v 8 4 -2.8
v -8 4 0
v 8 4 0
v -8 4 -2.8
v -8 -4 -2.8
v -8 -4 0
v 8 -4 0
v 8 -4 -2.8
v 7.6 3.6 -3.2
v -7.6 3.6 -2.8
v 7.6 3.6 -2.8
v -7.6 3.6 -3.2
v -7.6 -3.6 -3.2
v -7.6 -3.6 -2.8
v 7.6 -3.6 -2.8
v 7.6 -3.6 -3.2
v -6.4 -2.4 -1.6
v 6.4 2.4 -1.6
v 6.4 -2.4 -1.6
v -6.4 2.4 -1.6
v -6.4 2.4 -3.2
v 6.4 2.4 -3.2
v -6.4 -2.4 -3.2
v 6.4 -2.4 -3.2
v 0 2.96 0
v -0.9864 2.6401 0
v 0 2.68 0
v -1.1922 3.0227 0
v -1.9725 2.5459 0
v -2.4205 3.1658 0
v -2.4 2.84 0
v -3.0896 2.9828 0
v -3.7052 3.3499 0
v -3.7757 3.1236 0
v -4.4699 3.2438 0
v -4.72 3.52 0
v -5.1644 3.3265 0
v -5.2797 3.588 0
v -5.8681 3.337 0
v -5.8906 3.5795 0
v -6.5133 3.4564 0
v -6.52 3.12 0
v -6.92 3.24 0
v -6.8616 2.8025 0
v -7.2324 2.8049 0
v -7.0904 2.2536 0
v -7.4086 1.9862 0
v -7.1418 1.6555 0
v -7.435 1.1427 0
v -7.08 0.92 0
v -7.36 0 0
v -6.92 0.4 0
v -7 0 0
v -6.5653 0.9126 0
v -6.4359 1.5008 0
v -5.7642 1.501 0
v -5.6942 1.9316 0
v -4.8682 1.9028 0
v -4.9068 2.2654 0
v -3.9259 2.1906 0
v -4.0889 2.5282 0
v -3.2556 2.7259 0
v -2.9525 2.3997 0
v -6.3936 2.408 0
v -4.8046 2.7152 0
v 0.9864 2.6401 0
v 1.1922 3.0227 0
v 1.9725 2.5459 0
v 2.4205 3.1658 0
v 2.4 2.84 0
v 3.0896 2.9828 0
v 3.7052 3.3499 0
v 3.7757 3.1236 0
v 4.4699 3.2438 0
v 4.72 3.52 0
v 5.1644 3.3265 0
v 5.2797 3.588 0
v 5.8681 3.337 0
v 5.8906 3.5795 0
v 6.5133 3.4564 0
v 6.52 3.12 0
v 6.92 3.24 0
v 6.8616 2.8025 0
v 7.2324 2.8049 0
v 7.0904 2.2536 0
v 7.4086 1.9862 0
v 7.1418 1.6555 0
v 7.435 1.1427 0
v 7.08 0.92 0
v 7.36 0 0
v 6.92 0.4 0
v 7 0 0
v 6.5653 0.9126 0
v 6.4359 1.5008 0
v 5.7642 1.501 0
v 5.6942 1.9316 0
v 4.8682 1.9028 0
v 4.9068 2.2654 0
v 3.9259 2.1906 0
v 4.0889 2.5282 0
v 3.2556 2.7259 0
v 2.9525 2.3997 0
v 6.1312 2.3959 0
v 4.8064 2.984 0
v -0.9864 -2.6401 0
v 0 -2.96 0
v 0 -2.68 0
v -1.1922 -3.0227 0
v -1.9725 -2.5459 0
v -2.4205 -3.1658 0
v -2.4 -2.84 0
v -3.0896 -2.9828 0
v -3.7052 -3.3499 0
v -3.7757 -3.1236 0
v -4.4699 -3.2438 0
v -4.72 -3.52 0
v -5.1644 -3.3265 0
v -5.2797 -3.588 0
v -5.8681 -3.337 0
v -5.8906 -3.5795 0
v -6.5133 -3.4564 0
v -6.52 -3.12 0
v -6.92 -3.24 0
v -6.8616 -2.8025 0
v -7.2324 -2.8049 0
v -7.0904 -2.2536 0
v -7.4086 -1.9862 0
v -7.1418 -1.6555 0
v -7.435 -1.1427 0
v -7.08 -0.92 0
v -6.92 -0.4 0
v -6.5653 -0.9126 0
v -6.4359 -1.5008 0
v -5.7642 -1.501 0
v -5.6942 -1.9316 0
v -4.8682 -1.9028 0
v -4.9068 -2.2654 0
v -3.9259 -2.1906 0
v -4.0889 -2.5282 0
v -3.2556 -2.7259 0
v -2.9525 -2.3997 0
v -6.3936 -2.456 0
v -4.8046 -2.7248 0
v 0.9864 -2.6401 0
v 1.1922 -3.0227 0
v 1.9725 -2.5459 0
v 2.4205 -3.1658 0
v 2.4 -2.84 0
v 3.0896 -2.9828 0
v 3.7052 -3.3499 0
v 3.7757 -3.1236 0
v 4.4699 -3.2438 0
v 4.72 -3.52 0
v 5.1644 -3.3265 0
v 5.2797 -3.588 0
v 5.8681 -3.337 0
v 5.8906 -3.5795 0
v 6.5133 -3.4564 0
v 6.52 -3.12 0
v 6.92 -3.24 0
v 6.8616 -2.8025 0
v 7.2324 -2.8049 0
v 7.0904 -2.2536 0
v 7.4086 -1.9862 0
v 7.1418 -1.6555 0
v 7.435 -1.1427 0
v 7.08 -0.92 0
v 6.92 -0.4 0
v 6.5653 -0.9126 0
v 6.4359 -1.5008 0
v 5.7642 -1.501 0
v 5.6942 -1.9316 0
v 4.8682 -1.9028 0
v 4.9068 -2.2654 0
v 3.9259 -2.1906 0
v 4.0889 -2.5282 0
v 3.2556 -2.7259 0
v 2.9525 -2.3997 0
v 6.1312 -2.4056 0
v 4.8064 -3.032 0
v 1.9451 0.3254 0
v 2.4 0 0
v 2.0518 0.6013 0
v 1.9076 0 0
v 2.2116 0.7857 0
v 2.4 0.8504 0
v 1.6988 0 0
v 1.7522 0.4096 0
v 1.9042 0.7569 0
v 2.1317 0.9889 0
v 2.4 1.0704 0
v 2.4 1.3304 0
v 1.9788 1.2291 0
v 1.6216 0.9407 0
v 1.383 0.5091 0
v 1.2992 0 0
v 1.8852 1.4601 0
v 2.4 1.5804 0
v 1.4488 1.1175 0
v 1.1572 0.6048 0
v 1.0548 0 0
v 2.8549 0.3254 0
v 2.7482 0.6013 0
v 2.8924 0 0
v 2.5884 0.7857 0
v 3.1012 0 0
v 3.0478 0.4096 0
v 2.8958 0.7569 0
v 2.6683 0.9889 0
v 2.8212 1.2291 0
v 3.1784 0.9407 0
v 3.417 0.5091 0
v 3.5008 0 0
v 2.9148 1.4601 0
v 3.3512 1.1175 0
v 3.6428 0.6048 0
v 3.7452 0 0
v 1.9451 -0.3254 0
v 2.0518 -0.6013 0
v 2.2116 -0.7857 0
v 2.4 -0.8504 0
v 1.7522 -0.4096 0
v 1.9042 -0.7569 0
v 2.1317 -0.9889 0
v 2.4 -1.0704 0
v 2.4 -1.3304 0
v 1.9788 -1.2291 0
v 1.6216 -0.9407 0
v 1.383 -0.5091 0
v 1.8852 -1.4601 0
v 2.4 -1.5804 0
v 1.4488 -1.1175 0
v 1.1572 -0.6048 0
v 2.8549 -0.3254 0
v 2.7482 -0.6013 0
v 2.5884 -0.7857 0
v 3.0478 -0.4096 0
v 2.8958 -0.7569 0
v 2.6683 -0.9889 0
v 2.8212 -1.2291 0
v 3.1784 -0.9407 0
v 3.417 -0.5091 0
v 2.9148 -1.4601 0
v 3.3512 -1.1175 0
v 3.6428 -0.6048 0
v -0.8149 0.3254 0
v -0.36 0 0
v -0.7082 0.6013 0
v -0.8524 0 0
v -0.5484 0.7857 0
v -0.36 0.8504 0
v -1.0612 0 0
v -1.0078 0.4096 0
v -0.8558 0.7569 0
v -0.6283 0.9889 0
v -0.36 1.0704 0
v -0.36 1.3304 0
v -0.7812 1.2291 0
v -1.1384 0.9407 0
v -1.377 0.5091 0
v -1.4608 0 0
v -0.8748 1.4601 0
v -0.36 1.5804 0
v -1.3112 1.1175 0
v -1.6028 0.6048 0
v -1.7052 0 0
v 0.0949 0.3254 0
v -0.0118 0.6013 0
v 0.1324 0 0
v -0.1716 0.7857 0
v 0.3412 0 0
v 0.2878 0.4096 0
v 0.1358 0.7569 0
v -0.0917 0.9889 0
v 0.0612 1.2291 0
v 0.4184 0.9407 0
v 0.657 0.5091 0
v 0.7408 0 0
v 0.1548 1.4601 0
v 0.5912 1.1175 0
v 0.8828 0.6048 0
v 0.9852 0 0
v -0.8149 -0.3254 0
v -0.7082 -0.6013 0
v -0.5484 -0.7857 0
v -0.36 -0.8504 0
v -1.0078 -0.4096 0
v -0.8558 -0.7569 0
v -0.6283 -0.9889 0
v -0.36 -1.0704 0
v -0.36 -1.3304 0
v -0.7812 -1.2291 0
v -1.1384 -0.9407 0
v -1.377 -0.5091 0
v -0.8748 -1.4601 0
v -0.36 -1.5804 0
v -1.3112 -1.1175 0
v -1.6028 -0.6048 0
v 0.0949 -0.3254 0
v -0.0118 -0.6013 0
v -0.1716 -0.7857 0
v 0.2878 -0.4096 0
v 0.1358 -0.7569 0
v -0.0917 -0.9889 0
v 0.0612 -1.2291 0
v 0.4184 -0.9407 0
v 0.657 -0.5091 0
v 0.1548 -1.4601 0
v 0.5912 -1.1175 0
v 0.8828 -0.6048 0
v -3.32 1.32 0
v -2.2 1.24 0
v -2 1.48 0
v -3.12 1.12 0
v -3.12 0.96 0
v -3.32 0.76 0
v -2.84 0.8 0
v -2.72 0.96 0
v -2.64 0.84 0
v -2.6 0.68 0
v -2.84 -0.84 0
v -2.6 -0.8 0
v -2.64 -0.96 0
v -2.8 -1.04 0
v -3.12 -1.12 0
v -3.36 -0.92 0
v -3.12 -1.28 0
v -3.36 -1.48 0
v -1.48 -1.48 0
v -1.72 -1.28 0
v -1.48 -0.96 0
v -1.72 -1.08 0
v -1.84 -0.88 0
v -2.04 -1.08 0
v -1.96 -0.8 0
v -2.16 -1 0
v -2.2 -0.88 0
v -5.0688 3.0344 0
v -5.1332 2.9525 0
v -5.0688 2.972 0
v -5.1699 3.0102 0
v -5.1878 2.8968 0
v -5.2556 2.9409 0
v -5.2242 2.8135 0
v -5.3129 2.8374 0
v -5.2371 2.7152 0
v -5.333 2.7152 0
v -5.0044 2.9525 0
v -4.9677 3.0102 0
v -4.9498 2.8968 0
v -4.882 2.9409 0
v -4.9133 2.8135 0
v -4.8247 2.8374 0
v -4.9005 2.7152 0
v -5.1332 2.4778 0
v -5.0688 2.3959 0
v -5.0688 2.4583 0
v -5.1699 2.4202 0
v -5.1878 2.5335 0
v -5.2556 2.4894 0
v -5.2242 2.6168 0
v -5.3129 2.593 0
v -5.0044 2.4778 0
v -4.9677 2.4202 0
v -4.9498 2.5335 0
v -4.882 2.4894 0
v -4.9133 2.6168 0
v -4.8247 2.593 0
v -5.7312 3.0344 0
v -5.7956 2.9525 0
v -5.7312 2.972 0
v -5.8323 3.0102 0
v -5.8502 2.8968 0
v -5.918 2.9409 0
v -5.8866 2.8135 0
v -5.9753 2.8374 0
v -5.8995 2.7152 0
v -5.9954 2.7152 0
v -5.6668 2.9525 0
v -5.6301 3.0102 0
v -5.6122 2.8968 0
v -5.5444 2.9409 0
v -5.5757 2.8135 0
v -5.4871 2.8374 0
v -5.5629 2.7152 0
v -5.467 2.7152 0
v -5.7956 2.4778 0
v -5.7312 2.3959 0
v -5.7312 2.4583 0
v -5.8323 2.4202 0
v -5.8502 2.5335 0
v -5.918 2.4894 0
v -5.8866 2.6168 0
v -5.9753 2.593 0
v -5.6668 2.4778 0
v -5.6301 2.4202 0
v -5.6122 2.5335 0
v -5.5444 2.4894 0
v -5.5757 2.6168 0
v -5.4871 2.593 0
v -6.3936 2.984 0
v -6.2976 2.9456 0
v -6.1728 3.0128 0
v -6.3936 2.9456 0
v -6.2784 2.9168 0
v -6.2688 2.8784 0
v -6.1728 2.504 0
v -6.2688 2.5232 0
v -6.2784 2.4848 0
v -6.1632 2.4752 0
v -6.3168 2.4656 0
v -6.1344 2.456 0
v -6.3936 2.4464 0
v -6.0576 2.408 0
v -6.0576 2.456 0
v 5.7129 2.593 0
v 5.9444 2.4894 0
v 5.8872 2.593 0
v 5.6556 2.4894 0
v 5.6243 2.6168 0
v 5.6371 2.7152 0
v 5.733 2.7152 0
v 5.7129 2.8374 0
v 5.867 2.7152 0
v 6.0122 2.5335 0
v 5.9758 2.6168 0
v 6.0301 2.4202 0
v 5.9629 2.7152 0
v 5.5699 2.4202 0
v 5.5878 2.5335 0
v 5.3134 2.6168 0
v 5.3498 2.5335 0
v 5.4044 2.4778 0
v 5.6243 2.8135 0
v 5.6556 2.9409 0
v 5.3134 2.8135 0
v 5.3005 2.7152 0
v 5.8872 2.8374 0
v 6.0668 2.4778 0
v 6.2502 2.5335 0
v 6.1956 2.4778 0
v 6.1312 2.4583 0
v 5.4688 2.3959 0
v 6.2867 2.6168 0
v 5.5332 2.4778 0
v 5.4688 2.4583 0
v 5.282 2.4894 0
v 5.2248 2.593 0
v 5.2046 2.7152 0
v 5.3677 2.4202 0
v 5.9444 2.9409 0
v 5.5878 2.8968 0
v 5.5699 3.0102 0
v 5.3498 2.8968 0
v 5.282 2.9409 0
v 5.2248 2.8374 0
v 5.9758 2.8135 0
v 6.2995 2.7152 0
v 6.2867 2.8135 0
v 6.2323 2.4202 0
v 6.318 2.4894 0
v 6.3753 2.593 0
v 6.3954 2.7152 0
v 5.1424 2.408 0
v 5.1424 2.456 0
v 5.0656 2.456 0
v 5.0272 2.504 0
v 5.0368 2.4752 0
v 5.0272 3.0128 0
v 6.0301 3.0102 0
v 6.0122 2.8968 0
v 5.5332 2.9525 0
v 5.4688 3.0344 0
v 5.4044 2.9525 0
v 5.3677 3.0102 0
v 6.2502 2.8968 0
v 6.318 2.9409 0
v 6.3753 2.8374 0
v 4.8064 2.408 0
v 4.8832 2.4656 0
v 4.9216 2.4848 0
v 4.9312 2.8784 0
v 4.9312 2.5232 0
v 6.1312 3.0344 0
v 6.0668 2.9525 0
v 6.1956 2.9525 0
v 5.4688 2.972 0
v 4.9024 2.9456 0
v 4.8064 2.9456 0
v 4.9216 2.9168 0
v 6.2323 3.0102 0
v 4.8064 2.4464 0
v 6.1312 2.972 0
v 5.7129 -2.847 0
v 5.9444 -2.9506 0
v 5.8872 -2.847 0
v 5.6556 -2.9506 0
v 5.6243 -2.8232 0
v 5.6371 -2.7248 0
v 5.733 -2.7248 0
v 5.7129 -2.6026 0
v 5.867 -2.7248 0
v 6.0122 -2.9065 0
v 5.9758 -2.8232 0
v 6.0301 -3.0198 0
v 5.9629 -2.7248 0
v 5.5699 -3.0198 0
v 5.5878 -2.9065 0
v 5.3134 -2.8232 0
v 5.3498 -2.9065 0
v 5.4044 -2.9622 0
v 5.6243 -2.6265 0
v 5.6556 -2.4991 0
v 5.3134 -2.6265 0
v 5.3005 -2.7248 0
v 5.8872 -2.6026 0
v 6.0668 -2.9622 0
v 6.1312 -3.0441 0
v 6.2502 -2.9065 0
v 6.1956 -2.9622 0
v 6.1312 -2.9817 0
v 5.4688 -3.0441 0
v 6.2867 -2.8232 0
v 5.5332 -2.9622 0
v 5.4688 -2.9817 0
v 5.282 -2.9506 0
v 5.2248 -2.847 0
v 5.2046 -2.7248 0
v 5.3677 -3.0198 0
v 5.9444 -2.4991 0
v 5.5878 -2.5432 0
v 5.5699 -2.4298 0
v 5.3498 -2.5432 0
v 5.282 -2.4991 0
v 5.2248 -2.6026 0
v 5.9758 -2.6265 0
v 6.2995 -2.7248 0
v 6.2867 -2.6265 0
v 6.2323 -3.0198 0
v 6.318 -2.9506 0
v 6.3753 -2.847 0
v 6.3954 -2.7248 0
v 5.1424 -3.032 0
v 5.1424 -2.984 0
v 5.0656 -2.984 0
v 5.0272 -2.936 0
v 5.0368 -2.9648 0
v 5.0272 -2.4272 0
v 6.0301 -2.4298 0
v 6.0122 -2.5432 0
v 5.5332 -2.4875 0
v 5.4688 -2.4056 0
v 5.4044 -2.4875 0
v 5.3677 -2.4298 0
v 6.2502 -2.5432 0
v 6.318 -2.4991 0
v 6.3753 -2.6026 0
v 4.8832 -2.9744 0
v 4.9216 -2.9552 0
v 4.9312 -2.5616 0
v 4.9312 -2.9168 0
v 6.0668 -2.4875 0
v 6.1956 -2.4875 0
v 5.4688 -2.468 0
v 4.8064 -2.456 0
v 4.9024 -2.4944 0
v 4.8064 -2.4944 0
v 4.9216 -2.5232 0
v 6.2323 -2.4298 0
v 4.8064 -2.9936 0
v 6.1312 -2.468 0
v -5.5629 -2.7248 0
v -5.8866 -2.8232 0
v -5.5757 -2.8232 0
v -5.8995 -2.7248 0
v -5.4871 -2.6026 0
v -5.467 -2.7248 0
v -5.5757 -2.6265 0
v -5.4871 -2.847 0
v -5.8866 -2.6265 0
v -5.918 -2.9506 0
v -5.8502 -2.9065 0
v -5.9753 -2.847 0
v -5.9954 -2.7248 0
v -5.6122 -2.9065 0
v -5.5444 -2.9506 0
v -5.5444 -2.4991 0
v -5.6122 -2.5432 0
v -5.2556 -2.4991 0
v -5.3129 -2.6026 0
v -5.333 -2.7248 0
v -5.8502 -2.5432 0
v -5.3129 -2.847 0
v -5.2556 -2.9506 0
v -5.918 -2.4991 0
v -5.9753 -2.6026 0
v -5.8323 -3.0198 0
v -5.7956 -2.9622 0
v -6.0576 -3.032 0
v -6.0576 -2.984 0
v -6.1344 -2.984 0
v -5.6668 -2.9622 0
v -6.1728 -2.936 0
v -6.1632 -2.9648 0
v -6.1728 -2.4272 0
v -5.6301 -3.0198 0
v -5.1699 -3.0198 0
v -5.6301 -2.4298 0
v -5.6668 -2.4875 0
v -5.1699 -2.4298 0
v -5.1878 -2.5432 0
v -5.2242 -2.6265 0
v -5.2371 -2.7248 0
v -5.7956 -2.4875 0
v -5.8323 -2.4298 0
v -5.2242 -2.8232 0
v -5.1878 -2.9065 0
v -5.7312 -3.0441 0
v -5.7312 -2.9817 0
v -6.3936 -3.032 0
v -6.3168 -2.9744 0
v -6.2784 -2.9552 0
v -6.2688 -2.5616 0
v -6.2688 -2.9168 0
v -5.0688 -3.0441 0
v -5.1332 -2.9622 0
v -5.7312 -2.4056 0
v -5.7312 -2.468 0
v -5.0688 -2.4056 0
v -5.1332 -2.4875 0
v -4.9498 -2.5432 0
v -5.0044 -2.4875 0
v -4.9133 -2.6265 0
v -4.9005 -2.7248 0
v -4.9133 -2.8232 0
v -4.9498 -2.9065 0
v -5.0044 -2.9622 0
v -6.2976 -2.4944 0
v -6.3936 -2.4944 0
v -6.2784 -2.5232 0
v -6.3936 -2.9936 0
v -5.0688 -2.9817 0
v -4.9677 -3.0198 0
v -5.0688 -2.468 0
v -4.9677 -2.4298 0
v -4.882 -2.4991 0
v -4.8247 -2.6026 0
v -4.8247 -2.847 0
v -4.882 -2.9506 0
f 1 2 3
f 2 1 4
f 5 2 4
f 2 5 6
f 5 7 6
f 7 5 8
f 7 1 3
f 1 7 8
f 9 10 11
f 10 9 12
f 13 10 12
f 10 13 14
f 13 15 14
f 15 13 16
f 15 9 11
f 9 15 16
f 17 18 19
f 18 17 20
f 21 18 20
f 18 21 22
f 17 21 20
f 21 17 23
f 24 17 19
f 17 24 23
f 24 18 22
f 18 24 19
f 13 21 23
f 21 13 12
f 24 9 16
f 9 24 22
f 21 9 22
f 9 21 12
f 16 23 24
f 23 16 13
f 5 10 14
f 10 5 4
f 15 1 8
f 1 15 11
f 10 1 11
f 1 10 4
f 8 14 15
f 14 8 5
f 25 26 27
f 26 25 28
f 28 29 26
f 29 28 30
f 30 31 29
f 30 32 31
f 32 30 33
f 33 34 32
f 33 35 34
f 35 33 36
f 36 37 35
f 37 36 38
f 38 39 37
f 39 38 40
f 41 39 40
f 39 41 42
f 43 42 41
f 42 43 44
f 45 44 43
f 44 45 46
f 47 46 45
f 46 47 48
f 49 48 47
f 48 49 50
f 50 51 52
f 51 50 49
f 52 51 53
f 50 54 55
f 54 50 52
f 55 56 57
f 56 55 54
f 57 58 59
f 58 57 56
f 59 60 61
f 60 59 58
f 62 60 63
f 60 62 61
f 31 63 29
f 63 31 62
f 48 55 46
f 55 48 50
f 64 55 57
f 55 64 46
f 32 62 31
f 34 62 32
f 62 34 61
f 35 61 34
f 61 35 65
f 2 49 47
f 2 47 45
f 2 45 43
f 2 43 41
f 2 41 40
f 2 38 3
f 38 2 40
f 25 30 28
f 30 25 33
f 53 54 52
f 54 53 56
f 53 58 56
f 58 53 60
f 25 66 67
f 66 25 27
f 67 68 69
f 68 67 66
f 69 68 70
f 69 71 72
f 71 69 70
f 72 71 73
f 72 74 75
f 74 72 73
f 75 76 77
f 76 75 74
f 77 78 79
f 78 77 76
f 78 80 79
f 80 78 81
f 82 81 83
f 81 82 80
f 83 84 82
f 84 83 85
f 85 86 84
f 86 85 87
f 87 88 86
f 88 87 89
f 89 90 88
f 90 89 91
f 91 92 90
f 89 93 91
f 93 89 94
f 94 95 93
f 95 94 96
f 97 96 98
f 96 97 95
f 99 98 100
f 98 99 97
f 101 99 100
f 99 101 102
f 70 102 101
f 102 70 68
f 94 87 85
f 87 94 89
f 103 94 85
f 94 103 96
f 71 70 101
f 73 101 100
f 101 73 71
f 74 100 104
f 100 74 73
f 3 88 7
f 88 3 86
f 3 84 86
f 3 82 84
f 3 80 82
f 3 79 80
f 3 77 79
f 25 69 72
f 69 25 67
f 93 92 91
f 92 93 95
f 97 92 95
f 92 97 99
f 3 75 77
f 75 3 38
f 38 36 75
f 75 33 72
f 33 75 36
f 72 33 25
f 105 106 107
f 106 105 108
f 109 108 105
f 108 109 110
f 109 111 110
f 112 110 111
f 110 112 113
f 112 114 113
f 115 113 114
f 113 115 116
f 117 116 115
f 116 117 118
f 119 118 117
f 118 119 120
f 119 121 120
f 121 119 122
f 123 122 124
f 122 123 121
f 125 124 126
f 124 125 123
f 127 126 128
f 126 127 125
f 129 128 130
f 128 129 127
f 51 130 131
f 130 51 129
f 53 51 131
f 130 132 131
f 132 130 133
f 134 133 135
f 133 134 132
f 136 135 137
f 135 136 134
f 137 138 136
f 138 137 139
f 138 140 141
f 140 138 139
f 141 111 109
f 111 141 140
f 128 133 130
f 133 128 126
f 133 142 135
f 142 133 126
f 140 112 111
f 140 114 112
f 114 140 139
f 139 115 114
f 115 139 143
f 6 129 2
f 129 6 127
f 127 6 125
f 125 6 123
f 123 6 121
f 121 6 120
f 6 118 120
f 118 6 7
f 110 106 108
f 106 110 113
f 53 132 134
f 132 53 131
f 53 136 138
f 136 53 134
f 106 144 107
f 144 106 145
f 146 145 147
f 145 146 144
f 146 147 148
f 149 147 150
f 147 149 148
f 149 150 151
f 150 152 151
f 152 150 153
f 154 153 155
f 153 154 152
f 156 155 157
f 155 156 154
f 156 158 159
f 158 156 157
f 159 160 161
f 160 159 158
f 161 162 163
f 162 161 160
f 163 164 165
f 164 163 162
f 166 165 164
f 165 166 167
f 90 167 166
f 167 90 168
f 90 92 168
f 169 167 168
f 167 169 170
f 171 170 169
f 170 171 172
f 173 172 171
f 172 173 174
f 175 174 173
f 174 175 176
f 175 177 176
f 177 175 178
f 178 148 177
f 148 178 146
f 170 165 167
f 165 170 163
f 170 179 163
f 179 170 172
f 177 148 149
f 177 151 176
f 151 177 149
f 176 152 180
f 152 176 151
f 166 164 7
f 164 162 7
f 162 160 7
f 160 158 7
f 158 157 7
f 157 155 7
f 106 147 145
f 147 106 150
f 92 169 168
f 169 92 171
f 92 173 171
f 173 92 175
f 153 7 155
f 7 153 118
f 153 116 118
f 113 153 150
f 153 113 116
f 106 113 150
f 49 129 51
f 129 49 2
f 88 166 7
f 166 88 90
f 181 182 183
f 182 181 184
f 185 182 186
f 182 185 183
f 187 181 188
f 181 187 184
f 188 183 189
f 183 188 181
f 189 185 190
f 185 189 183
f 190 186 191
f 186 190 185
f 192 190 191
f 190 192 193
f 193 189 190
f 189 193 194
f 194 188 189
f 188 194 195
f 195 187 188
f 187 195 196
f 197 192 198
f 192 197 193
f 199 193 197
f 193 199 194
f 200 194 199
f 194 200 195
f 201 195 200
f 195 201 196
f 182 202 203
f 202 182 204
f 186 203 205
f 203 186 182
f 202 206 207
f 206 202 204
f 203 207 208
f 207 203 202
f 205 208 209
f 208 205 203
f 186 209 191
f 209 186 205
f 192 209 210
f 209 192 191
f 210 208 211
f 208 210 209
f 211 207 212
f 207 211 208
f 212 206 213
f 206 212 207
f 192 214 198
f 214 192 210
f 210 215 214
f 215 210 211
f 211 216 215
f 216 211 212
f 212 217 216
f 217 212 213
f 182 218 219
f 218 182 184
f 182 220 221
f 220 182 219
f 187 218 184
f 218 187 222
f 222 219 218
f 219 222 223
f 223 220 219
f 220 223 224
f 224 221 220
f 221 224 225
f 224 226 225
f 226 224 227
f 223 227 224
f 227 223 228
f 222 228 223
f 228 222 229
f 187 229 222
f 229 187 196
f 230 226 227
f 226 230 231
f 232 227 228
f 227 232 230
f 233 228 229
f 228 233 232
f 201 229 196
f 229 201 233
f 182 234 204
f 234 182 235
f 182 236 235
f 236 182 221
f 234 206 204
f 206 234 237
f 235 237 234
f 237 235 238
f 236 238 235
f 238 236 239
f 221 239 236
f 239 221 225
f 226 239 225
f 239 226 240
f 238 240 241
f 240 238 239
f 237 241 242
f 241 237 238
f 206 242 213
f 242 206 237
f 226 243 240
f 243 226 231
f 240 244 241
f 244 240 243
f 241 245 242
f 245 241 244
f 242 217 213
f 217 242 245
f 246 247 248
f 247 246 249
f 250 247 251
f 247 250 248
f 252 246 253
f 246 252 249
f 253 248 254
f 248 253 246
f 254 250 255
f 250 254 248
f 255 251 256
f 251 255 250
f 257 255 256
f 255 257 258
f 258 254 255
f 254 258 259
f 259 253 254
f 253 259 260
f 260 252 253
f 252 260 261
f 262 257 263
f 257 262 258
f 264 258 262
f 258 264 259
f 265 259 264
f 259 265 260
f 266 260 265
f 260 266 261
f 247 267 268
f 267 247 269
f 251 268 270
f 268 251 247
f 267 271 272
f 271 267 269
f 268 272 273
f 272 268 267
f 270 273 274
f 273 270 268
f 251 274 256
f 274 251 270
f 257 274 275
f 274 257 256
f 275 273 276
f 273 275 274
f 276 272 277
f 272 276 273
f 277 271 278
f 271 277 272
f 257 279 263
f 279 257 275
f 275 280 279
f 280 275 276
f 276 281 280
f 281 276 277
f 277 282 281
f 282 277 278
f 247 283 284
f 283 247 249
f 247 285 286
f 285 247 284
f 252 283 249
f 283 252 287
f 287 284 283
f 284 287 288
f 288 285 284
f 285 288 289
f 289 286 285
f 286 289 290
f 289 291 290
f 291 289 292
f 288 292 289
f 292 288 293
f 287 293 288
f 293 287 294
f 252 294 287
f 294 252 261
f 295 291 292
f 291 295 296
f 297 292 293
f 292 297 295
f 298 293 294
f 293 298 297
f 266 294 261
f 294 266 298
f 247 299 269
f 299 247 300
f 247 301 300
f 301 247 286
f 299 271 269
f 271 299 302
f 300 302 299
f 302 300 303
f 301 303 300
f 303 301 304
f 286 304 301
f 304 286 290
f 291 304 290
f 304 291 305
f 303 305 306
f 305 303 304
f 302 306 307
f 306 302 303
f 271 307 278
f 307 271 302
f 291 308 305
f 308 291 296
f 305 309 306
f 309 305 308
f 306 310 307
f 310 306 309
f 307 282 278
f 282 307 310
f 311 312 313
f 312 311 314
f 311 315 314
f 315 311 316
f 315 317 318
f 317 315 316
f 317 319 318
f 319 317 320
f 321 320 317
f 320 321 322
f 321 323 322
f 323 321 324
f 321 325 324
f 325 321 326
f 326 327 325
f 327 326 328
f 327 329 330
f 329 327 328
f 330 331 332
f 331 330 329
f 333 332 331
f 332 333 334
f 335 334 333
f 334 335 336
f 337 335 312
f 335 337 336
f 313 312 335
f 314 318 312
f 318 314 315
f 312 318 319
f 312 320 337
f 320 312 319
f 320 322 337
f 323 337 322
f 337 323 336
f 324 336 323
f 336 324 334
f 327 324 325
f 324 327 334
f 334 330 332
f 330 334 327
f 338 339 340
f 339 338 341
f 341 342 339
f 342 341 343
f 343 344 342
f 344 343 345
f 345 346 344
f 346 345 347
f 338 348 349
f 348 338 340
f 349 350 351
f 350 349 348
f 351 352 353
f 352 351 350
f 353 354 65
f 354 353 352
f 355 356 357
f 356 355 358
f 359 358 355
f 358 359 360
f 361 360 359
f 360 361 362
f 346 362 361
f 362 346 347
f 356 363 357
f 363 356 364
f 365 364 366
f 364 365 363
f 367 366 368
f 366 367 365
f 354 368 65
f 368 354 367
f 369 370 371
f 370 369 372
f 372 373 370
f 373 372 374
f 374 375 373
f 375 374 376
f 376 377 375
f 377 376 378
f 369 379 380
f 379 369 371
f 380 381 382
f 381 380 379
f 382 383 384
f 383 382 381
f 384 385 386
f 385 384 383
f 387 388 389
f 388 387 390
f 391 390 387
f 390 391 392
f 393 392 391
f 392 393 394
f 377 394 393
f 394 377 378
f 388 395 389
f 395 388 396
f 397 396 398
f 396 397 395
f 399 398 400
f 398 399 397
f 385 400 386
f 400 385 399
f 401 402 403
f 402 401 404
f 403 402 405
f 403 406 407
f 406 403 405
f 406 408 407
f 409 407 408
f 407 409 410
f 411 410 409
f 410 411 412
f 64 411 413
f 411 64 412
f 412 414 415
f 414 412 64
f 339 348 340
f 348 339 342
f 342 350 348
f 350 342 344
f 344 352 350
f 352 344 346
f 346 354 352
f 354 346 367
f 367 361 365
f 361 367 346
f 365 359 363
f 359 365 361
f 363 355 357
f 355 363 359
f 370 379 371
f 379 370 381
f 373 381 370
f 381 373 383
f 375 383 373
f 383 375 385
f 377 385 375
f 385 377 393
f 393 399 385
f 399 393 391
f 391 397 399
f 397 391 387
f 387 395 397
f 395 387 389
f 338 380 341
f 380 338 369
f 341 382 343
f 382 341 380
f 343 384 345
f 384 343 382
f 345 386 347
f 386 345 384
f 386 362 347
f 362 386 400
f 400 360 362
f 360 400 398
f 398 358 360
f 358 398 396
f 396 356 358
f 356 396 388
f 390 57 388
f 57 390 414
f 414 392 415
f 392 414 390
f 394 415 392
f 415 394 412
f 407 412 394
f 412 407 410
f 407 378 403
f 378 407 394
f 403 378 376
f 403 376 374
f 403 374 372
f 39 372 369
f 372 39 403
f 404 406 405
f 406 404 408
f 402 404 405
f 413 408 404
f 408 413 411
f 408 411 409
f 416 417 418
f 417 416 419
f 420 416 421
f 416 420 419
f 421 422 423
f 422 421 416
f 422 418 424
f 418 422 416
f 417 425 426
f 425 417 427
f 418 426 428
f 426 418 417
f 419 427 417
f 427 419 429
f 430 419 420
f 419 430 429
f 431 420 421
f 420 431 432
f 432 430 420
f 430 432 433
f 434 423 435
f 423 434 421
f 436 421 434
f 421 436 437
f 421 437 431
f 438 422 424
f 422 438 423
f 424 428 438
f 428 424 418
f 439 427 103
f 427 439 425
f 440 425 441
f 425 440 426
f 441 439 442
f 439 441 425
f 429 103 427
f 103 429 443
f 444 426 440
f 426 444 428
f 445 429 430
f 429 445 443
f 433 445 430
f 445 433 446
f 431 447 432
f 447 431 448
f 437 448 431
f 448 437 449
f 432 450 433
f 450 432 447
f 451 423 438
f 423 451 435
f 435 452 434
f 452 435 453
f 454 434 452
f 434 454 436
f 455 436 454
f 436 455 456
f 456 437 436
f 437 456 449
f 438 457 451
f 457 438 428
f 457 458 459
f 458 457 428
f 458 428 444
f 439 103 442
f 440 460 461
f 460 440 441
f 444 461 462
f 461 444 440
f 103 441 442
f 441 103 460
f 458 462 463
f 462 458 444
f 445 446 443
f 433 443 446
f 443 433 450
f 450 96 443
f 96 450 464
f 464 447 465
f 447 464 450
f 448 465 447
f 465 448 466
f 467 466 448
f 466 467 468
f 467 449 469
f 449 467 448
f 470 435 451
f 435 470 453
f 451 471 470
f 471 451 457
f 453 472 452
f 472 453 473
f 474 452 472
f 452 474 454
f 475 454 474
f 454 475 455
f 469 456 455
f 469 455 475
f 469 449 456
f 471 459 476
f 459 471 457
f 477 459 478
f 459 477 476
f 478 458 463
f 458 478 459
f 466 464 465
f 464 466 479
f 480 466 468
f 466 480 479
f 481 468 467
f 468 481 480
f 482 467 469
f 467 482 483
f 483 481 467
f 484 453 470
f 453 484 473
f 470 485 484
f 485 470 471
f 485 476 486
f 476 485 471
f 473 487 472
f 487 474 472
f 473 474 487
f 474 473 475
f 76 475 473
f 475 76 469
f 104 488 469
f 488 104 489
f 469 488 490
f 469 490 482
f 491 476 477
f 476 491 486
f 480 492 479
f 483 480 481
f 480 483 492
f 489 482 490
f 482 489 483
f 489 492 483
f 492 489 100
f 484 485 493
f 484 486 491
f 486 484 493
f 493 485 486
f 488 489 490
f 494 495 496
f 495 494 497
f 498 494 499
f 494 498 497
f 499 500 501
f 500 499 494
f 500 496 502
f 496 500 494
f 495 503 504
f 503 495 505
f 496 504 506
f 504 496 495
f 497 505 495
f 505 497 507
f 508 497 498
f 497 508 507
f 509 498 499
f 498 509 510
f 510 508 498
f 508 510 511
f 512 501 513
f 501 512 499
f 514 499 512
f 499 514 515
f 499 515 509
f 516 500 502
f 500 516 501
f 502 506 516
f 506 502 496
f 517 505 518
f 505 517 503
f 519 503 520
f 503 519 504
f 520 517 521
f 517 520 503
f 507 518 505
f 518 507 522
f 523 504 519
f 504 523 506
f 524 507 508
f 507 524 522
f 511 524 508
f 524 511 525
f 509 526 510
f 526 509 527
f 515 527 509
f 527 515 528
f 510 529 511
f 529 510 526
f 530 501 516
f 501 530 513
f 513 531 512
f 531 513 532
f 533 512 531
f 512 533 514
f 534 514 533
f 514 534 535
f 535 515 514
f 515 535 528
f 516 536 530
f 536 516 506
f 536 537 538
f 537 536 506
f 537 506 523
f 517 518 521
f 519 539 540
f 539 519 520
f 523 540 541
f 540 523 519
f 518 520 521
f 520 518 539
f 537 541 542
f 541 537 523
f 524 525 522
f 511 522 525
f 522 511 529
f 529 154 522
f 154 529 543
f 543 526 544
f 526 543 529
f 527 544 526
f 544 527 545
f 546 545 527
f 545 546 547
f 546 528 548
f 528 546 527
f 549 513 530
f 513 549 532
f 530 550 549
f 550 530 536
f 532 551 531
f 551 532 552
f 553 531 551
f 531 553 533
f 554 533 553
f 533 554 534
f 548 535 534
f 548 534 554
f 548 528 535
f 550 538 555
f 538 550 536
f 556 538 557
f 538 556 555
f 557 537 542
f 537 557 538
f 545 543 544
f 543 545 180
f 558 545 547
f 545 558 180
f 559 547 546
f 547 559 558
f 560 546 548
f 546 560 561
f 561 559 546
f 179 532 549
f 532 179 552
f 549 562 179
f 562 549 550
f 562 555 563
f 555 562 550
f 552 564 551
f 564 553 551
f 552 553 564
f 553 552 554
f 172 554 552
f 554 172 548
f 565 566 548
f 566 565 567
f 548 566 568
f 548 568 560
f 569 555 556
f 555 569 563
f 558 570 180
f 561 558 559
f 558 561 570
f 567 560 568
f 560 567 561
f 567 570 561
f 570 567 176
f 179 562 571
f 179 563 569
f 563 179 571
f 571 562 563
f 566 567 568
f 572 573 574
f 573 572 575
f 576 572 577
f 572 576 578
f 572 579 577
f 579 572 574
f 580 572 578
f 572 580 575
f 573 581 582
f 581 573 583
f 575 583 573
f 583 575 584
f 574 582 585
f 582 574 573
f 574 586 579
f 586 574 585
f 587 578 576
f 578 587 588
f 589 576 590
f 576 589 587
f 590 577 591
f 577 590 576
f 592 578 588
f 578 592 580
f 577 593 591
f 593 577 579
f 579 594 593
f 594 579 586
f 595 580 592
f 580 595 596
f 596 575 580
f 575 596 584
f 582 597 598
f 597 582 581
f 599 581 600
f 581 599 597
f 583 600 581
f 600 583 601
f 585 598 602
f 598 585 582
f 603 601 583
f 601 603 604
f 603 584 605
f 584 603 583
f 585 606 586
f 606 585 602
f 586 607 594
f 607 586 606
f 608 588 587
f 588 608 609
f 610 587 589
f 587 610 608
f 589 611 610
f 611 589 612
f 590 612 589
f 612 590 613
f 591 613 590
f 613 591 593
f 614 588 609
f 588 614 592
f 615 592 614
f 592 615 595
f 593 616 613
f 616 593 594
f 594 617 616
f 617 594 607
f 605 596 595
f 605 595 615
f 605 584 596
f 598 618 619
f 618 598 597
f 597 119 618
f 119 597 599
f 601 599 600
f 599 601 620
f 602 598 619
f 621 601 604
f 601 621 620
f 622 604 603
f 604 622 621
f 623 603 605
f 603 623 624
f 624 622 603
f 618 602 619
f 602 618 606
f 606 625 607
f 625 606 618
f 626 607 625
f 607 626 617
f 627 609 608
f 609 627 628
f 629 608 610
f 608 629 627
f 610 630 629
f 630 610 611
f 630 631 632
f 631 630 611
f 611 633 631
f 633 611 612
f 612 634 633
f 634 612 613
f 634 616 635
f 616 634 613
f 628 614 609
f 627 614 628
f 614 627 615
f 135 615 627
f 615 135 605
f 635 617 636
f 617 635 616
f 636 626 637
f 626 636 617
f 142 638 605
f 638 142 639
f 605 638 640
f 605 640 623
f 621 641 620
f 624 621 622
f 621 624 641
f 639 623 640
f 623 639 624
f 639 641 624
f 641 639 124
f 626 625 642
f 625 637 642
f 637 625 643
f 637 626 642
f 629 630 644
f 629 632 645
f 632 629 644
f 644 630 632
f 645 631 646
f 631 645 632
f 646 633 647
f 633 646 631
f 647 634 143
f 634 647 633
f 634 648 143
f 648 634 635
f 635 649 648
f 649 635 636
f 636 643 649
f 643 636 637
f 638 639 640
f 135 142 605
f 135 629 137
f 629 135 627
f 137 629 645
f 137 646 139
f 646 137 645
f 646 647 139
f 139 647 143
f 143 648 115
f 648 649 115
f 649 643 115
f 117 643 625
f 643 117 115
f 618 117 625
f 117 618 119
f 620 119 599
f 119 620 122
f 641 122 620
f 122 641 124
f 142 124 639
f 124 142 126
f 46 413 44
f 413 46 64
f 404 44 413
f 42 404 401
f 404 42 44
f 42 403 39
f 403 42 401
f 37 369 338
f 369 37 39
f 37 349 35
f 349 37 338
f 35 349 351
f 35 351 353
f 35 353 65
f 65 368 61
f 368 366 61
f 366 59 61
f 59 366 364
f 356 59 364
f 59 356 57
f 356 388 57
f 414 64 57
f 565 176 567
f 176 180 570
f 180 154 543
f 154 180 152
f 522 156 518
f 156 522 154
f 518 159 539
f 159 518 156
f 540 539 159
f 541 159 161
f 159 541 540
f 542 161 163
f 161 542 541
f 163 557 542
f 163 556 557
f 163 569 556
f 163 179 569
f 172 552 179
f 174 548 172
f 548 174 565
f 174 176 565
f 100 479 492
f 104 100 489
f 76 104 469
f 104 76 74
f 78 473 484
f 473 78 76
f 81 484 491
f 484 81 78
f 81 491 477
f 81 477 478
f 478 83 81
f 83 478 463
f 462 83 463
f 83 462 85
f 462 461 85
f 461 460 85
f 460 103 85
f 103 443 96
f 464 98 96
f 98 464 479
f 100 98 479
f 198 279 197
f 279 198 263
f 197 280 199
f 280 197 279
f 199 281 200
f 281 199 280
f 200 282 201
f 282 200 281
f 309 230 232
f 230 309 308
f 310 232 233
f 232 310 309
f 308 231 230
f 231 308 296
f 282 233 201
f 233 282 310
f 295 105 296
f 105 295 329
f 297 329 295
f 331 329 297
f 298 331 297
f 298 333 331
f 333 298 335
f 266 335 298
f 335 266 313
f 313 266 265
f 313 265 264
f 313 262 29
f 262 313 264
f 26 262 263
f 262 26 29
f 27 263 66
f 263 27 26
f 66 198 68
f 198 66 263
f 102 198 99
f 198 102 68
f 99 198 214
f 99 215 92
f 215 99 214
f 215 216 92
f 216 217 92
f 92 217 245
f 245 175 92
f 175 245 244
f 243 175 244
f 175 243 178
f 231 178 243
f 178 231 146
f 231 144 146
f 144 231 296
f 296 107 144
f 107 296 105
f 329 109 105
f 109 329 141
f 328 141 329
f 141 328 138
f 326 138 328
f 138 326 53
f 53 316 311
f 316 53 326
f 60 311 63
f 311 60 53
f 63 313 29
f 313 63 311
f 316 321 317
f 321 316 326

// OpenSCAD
use <../lib.scad>
use <s/3069bpw2s01.scad>
use <s/3069bs01.scad>
function ldraw_lib__3069bpw2() = [
// 0 Tile  1 x  2 with "100" Money Pattern
// 0 Name: 3069bpw2.dat
// 0 Author: Alex Taylor [anathema]
// 0 !LDRAW_ORG Part UPDATE 2025-07
// 0 !LICENSE Licensed under CC BY 4.0 : see CAreadme.txt
// 
// 0 BFC CERTIFY CCW
  [0,"BFC","CERTIFY"],
  [0,"BFC","CCW"],
// 
// 0 !KEYWORDS Banknote, Bricklink 3069px7, dollar, Note, Paper money
// 0 !KEYWORDS Rebrickable 3069bpr0100, Set 6562
// 
// 0 !HISTORY 2009-12-29 [PTadmin] Official Update 2009-03
// 0 !HISTORY 2017-07-12 [Philo] A bit more detailed pattern, added keywords
// 0 !HISTORY 2017-12-30 [PTadmin] Official Update 2017-01
// 0 !HISTORY 2024-11-26 [RainbowDolphin] Subfiled pattern, added keywords
// 0 !HISTORY 2025-07-27 [OrionP] Official Update 2025-07
// 
// 1 16 0 0 0 1 0 0 0 1 0 0 0 1 s\3069bs01.dat
  [1,16,0,0,0,1,0,0,0,1,0,0,0,1, ldraw_lib__s__3069bs01()],
// 1 16 0 0 0 1 0 0 0 1 0 0 0 1 s\3069bpw2s01.dat
  [1,16,0,0,0,1,0,0,0,1,0,0,0,1, ldraw_lib__s__3069bpw2s01()],
];
module ldraw_lib__3069bpw2(step=0, col=false, unit=2/5, alt=false, line=0.2, solid=!$preview)
    makepoly(ldraw_lib__3069bpw2(), step=step, col=col, unit=unit, alt=alt, line=line, solid=solid);
ldraw_lib__3069bpw2(line=0.2);
